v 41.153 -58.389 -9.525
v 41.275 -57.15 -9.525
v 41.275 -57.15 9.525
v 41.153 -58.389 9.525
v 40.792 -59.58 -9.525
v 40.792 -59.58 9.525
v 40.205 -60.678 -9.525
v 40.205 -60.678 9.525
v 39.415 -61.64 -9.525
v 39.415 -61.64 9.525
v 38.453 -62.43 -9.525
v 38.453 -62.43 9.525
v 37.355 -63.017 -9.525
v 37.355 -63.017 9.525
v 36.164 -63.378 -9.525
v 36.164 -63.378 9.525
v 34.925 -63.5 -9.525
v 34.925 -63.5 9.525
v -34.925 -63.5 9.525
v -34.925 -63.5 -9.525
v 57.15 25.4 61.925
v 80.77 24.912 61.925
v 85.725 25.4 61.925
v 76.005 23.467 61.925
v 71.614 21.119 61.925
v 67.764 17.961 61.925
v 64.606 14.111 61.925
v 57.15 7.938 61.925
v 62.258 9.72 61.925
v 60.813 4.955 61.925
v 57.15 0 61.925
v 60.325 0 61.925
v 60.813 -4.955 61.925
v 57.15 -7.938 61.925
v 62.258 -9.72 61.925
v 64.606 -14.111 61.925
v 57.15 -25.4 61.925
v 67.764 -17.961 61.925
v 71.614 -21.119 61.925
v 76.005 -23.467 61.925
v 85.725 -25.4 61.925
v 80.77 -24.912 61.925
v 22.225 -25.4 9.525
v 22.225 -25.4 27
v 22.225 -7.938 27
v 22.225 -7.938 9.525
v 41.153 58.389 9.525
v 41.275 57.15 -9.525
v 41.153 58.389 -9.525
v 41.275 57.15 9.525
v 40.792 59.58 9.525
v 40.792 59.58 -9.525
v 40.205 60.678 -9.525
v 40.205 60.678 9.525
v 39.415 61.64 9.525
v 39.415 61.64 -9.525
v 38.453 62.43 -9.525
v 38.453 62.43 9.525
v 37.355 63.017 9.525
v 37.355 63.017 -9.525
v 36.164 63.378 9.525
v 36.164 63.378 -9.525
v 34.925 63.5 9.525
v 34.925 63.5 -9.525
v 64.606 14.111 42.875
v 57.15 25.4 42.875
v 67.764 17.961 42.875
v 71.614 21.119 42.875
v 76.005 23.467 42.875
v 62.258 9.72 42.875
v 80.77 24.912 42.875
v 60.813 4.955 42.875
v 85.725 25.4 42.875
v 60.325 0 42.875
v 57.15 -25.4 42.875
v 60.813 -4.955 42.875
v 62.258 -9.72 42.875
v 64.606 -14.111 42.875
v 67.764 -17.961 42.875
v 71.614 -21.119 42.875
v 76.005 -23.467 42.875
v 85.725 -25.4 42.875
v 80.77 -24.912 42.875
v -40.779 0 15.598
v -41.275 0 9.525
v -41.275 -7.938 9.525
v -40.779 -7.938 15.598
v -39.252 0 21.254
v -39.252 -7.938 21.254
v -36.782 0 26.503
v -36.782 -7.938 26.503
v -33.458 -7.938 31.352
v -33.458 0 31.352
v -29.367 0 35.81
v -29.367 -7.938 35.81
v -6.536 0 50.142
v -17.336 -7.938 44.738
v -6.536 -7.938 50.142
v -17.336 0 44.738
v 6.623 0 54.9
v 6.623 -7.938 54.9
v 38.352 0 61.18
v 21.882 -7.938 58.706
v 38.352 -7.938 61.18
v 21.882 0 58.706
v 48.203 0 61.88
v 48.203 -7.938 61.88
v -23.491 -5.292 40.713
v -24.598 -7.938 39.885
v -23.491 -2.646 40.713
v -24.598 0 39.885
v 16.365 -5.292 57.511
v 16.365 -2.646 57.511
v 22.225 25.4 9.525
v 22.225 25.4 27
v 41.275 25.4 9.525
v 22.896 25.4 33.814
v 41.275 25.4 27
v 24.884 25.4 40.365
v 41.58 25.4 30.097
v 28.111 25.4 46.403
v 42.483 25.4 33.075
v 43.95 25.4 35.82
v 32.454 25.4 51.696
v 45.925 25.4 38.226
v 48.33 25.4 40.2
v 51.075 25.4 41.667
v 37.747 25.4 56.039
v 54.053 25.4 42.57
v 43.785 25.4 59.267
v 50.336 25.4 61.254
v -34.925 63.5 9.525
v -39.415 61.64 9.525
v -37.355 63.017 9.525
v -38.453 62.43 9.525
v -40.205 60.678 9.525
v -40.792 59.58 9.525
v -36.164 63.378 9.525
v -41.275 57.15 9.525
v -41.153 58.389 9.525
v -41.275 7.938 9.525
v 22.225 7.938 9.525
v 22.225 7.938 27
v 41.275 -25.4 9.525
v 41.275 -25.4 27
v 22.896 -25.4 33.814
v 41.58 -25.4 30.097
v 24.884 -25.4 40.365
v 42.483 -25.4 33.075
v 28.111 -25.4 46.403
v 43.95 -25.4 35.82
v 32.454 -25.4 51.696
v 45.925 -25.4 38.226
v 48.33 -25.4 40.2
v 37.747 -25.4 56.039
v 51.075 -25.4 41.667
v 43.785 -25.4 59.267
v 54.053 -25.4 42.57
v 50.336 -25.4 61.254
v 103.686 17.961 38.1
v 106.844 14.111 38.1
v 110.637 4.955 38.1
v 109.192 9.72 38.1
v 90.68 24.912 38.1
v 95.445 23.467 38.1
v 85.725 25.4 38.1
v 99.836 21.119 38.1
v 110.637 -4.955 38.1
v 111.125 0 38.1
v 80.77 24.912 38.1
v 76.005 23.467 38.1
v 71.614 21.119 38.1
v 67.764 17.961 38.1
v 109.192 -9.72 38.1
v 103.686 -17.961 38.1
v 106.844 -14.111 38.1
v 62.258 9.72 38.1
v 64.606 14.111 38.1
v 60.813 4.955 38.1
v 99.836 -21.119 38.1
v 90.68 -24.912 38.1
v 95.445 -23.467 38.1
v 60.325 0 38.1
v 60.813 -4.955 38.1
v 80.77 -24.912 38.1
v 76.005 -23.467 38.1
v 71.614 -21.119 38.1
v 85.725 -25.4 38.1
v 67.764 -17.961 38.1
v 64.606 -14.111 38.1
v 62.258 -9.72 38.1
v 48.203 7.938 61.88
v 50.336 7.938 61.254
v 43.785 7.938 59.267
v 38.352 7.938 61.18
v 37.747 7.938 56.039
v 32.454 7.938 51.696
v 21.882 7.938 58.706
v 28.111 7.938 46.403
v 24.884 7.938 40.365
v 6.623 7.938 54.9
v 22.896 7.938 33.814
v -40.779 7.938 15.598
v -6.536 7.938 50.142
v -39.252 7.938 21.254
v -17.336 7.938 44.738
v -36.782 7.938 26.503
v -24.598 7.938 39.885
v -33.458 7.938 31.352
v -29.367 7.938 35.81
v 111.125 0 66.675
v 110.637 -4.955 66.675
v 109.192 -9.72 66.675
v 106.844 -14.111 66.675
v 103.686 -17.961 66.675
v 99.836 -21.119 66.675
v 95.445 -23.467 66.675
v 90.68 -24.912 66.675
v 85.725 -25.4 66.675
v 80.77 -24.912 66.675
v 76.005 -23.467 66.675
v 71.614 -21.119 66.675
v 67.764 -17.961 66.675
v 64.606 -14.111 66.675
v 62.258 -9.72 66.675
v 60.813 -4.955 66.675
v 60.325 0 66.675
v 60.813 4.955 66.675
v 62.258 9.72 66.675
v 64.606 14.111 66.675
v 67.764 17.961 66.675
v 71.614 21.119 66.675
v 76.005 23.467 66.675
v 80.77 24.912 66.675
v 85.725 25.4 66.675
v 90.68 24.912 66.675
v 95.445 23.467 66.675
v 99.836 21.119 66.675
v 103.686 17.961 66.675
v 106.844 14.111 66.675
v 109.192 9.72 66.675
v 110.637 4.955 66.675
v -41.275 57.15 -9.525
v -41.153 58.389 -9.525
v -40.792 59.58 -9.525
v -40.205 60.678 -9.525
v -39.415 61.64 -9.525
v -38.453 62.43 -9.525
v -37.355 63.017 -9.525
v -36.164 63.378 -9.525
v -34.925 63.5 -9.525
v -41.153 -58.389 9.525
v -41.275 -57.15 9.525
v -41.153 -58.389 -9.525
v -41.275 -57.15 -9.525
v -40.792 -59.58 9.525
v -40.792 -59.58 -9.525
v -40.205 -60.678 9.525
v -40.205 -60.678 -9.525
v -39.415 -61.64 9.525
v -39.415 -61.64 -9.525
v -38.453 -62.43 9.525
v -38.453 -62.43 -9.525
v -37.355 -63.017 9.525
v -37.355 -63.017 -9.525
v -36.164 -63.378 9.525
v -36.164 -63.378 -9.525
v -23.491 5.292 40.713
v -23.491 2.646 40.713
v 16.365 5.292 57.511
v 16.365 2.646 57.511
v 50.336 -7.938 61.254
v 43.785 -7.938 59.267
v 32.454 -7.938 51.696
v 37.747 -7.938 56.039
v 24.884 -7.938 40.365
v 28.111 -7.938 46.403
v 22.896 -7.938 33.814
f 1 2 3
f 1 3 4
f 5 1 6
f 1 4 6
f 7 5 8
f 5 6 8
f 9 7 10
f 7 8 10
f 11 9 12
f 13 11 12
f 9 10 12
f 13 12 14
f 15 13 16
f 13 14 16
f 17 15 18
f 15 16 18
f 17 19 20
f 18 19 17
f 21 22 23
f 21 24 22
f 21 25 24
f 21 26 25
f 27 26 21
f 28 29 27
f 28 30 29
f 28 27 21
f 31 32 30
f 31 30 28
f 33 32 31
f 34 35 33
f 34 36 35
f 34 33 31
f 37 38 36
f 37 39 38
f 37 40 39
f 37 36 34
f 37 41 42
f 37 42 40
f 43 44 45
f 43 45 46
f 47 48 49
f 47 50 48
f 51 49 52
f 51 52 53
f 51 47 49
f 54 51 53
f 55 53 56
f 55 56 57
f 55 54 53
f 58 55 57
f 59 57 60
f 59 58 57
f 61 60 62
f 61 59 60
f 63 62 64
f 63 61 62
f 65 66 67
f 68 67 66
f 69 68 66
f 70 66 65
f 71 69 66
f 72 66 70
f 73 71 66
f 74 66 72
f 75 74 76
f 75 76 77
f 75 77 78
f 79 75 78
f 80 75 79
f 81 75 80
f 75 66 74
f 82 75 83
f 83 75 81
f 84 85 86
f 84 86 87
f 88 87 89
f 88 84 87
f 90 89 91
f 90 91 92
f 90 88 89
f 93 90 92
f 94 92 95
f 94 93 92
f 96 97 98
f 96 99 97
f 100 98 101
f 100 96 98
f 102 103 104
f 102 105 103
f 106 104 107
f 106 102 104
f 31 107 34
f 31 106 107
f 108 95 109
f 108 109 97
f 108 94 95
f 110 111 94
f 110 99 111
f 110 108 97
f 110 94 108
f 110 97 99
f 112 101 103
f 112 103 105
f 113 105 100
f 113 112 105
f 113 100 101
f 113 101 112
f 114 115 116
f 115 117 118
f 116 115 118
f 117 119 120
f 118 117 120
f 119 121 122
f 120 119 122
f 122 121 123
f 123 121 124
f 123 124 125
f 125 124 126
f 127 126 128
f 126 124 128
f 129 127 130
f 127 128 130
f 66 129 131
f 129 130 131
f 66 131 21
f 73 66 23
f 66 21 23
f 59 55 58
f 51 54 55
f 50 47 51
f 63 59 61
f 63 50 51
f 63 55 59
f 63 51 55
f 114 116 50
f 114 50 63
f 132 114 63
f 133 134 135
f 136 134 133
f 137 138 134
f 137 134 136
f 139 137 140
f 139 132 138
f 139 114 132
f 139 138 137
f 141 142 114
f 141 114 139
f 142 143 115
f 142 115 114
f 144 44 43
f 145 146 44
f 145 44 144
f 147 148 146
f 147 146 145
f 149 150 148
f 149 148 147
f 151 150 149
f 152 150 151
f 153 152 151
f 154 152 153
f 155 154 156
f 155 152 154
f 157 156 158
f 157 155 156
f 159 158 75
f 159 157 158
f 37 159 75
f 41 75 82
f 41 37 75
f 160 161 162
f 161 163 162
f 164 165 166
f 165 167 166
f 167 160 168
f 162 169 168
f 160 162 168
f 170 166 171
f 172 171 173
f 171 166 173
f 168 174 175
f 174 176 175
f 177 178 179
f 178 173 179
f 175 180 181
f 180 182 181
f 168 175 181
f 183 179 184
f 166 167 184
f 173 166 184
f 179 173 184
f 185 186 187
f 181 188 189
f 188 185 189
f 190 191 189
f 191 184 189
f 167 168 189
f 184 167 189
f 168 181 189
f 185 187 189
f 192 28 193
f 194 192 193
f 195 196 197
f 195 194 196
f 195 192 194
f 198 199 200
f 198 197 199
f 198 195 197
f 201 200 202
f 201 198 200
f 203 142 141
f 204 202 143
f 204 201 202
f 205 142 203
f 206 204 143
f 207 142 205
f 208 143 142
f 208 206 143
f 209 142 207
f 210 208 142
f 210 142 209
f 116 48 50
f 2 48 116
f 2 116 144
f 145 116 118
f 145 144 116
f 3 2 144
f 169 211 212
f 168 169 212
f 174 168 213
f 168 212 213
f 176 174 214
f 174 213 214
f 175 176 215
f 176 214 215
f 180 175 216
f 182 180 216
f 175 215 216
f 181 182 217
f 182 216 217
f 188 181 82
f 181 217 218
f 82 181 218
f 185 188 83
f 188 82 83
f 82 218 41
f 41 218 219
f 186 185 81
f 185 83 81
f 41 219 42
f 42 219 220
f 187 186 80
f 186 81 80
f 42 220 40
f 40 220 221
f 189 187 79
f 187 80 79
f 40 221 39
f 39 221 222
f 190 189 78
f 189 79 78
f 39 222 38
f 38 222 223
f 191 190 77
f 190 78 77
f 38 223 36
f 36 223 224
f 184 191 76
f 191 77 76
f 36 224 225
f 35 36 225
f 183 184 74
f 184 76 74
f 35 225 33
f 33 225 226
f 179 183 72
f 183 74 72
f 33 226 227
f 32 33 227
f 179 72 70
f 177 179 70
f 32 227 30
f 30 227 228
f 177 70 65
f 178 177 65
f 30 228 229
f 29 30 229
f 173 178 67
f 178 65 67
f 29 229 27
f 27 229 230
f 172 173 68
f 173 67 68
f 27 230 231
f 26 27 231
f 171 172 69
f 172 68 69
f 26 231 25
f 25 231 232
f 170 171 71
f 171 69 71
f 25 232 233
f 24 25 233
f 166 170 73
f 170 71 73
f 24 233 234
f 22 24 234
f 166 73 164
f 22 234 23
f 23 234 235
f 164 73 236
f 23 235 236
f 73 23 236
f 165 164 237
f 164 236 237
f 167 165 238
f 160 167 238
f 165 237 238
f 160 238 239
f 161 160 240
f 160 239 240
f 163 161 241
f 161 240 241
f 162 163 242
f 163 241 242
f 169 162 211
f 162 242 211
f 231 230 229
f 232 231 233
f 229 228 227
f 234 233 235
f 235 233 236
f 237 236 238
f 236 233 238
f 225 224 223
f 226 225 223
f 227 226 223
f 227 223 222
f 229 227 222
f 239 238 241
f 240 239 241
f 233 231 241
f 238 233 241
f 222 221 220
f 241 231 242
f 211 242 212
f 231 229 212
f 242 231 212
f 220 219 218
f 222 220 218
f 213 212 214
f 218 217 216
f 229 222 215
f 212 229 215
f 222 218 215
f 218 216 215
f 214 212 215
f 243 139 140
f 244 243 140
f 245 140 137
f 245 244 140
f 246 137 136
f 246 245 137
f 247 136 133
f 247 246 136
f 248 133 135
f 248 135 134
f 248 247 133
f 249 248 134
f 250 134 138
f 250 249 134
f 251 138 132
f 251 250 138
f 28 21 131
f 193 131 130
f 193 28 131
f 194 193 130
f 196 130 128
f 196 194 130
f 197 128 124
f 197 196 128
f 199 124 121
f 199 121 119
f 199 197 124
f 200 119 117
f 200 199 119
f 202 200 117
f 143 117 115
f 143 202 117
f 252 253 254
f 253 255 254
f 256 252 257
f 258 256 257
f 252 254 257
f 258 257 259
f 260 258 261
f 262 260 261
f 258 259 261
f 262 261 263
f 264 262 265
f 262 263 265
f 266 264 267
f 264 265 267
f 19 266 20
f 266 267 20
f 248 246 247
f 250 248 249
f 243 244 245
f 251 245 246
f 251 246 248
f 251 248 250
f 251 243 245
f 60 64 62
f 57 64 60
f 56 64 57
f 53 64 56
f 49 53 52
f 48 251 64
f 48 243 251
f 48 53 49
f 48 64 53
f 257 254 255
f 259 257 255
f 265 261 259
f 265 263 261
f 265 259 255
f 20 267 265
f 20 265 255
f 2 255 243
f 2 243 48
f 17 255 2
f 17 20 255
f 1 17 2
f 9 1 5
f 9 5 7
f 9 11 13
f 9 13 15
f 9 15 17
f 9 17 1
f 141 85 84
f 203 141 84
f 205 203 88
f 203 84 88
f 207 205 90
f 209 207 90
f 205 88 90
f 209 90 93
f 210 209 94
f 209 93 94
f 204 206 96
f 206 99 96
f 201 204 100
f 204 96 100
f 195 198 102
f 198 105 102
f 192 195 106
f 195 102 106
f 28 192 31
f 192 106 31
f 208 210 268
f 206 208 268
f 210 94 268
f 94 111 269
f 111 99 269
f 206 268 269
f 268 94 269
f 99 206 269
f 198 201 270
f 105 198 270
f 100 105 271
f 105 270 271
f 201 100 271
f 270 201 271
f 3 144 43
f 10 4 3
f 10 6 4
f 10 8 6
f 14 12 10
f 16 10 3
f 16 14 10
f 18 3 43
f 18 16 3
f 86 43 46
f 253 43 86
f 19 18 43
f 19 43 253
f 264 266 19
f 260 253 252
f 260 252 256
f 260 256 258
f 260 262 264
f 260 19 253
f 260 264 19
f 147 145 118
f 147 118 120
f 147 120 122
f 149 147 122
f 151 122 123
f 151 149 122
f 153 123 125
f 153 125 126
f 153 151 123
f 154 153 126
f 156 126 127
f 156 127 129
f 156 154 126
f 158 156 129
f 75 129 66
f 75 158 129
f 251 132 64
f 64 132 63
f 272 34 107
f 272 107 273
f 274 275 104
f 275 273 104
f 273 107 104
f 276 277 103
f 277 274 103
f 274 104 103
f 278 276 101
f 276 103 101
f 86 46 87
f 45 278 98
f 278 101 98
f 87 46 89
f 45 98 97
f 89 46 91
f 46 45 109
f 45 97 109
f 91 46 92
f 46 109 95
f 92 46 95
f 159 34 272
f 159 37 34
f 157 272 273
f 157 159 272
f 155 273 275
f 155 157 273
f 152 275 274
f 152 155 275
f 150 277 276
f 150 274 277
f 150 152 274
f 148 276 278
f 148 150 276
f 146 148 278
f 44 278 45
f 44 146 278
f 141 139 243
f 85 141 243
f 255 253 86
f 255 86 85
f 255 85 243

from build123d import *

# Parameters (mm, degrees)
F1_DEPTH = 63.5
F2_DEPTH = 25.4
F3_DEPTH = 7.9375
F5_R     = 6.35


with BuildPart() as f1:
    # F0 (on Front) → F1 (new body, symmetric)
    with BuildSketch(Plane.XZ):
        Polygon((22.225, 9.525), (-41.275, 9.525), (-41.275, -9.525), (41.275, -9.525), (41.275, 9.525), align=None)
    extrude(amount=F1_DEPTH, both=True)

    # F0 (on Front) → F2 (join, symmetric)
    with BuildSketch(Plane.XZ):
        with BuildLine():
            Line((22.225, 27.0002), (22.225, 9.525))
            Line((22.225, 9.525), (41.275, 9.525))
            Line((41.275, 9.525), (41.275, 27.0002))
            ThreePointArc((41.275, 27.0002), (45.9246798487, 38.2255201513), (57.15, 42.8752))
            Line((57.15, 42.8752), (60.325, 42.8752))
            Line((60.325, 42.8752), (60.325, 61.9252))
            Line((60.325, 61.9252), (57.15, 61.9252))
            ThreePointArc((57.15, 61.9252), (32.4542956671, 51.6959043329), (22.225, 27.0002))
        make_face()
        Polygon((85.725, 61.9252), (60.325, 61.9252), (60.325, 42.8752), (85.725, 42.8752), (85.725, 52.3875), align=None)
    extrude(amount=F2_DEPTH, both=True)

    # F0 (on Front) → F3 (join, symmetric)
    with BuildSketch(Plane.XZ):
        with BuildLine():
            add(Edge.make_bspline(
                [(-41.275, 9.525), (-41.5751747787, 48.5781729221), (22.9490175843, 63.0326196551), (57.15, 61.9252)],
                knots=[0, 0, 0, 0, 111.5045361635, 111.5045361635, 111.5045361635, 111.5045361635], degree=3))
            Line((-41.275, 9.525), (22.225, 9.525))
            Line((22.225, 9.525), (22.225, 27.0002))
            ThreePointArc((22.225, 27.0002), (32.4542956671, 51.6959043329), (57.15, 61.9252))
        make_face()
    extrude(amount=F3_DEPTH, both=True)

    # F0 (on Front) → F4 (revolve)
    with BuildSketch(Plane.XZ):
        Polygon((85.725, 66.675), (85.725, 61.9252), (85.725, 52.3875), (85.725, 42.8752), (85.725, 38.1), (111.125, 38.1), (111.125, 66.675), align=None)
    revolve(axis=Axis((85.725, 0, 21.2952332962), (0, 0, -1)))

    # F5
    f5_edges = [f1.edges().sort_by_distance(p)[0] for p in [
        (41.275, -63.5, 0),
        (-41.275, -63.5, 0),
        (-41.275, 63.5, 0),
        (41.275, 63.5, 0),
    ]]
    fillet(f5_edges, radius=F5_R)


solid = f1.part
